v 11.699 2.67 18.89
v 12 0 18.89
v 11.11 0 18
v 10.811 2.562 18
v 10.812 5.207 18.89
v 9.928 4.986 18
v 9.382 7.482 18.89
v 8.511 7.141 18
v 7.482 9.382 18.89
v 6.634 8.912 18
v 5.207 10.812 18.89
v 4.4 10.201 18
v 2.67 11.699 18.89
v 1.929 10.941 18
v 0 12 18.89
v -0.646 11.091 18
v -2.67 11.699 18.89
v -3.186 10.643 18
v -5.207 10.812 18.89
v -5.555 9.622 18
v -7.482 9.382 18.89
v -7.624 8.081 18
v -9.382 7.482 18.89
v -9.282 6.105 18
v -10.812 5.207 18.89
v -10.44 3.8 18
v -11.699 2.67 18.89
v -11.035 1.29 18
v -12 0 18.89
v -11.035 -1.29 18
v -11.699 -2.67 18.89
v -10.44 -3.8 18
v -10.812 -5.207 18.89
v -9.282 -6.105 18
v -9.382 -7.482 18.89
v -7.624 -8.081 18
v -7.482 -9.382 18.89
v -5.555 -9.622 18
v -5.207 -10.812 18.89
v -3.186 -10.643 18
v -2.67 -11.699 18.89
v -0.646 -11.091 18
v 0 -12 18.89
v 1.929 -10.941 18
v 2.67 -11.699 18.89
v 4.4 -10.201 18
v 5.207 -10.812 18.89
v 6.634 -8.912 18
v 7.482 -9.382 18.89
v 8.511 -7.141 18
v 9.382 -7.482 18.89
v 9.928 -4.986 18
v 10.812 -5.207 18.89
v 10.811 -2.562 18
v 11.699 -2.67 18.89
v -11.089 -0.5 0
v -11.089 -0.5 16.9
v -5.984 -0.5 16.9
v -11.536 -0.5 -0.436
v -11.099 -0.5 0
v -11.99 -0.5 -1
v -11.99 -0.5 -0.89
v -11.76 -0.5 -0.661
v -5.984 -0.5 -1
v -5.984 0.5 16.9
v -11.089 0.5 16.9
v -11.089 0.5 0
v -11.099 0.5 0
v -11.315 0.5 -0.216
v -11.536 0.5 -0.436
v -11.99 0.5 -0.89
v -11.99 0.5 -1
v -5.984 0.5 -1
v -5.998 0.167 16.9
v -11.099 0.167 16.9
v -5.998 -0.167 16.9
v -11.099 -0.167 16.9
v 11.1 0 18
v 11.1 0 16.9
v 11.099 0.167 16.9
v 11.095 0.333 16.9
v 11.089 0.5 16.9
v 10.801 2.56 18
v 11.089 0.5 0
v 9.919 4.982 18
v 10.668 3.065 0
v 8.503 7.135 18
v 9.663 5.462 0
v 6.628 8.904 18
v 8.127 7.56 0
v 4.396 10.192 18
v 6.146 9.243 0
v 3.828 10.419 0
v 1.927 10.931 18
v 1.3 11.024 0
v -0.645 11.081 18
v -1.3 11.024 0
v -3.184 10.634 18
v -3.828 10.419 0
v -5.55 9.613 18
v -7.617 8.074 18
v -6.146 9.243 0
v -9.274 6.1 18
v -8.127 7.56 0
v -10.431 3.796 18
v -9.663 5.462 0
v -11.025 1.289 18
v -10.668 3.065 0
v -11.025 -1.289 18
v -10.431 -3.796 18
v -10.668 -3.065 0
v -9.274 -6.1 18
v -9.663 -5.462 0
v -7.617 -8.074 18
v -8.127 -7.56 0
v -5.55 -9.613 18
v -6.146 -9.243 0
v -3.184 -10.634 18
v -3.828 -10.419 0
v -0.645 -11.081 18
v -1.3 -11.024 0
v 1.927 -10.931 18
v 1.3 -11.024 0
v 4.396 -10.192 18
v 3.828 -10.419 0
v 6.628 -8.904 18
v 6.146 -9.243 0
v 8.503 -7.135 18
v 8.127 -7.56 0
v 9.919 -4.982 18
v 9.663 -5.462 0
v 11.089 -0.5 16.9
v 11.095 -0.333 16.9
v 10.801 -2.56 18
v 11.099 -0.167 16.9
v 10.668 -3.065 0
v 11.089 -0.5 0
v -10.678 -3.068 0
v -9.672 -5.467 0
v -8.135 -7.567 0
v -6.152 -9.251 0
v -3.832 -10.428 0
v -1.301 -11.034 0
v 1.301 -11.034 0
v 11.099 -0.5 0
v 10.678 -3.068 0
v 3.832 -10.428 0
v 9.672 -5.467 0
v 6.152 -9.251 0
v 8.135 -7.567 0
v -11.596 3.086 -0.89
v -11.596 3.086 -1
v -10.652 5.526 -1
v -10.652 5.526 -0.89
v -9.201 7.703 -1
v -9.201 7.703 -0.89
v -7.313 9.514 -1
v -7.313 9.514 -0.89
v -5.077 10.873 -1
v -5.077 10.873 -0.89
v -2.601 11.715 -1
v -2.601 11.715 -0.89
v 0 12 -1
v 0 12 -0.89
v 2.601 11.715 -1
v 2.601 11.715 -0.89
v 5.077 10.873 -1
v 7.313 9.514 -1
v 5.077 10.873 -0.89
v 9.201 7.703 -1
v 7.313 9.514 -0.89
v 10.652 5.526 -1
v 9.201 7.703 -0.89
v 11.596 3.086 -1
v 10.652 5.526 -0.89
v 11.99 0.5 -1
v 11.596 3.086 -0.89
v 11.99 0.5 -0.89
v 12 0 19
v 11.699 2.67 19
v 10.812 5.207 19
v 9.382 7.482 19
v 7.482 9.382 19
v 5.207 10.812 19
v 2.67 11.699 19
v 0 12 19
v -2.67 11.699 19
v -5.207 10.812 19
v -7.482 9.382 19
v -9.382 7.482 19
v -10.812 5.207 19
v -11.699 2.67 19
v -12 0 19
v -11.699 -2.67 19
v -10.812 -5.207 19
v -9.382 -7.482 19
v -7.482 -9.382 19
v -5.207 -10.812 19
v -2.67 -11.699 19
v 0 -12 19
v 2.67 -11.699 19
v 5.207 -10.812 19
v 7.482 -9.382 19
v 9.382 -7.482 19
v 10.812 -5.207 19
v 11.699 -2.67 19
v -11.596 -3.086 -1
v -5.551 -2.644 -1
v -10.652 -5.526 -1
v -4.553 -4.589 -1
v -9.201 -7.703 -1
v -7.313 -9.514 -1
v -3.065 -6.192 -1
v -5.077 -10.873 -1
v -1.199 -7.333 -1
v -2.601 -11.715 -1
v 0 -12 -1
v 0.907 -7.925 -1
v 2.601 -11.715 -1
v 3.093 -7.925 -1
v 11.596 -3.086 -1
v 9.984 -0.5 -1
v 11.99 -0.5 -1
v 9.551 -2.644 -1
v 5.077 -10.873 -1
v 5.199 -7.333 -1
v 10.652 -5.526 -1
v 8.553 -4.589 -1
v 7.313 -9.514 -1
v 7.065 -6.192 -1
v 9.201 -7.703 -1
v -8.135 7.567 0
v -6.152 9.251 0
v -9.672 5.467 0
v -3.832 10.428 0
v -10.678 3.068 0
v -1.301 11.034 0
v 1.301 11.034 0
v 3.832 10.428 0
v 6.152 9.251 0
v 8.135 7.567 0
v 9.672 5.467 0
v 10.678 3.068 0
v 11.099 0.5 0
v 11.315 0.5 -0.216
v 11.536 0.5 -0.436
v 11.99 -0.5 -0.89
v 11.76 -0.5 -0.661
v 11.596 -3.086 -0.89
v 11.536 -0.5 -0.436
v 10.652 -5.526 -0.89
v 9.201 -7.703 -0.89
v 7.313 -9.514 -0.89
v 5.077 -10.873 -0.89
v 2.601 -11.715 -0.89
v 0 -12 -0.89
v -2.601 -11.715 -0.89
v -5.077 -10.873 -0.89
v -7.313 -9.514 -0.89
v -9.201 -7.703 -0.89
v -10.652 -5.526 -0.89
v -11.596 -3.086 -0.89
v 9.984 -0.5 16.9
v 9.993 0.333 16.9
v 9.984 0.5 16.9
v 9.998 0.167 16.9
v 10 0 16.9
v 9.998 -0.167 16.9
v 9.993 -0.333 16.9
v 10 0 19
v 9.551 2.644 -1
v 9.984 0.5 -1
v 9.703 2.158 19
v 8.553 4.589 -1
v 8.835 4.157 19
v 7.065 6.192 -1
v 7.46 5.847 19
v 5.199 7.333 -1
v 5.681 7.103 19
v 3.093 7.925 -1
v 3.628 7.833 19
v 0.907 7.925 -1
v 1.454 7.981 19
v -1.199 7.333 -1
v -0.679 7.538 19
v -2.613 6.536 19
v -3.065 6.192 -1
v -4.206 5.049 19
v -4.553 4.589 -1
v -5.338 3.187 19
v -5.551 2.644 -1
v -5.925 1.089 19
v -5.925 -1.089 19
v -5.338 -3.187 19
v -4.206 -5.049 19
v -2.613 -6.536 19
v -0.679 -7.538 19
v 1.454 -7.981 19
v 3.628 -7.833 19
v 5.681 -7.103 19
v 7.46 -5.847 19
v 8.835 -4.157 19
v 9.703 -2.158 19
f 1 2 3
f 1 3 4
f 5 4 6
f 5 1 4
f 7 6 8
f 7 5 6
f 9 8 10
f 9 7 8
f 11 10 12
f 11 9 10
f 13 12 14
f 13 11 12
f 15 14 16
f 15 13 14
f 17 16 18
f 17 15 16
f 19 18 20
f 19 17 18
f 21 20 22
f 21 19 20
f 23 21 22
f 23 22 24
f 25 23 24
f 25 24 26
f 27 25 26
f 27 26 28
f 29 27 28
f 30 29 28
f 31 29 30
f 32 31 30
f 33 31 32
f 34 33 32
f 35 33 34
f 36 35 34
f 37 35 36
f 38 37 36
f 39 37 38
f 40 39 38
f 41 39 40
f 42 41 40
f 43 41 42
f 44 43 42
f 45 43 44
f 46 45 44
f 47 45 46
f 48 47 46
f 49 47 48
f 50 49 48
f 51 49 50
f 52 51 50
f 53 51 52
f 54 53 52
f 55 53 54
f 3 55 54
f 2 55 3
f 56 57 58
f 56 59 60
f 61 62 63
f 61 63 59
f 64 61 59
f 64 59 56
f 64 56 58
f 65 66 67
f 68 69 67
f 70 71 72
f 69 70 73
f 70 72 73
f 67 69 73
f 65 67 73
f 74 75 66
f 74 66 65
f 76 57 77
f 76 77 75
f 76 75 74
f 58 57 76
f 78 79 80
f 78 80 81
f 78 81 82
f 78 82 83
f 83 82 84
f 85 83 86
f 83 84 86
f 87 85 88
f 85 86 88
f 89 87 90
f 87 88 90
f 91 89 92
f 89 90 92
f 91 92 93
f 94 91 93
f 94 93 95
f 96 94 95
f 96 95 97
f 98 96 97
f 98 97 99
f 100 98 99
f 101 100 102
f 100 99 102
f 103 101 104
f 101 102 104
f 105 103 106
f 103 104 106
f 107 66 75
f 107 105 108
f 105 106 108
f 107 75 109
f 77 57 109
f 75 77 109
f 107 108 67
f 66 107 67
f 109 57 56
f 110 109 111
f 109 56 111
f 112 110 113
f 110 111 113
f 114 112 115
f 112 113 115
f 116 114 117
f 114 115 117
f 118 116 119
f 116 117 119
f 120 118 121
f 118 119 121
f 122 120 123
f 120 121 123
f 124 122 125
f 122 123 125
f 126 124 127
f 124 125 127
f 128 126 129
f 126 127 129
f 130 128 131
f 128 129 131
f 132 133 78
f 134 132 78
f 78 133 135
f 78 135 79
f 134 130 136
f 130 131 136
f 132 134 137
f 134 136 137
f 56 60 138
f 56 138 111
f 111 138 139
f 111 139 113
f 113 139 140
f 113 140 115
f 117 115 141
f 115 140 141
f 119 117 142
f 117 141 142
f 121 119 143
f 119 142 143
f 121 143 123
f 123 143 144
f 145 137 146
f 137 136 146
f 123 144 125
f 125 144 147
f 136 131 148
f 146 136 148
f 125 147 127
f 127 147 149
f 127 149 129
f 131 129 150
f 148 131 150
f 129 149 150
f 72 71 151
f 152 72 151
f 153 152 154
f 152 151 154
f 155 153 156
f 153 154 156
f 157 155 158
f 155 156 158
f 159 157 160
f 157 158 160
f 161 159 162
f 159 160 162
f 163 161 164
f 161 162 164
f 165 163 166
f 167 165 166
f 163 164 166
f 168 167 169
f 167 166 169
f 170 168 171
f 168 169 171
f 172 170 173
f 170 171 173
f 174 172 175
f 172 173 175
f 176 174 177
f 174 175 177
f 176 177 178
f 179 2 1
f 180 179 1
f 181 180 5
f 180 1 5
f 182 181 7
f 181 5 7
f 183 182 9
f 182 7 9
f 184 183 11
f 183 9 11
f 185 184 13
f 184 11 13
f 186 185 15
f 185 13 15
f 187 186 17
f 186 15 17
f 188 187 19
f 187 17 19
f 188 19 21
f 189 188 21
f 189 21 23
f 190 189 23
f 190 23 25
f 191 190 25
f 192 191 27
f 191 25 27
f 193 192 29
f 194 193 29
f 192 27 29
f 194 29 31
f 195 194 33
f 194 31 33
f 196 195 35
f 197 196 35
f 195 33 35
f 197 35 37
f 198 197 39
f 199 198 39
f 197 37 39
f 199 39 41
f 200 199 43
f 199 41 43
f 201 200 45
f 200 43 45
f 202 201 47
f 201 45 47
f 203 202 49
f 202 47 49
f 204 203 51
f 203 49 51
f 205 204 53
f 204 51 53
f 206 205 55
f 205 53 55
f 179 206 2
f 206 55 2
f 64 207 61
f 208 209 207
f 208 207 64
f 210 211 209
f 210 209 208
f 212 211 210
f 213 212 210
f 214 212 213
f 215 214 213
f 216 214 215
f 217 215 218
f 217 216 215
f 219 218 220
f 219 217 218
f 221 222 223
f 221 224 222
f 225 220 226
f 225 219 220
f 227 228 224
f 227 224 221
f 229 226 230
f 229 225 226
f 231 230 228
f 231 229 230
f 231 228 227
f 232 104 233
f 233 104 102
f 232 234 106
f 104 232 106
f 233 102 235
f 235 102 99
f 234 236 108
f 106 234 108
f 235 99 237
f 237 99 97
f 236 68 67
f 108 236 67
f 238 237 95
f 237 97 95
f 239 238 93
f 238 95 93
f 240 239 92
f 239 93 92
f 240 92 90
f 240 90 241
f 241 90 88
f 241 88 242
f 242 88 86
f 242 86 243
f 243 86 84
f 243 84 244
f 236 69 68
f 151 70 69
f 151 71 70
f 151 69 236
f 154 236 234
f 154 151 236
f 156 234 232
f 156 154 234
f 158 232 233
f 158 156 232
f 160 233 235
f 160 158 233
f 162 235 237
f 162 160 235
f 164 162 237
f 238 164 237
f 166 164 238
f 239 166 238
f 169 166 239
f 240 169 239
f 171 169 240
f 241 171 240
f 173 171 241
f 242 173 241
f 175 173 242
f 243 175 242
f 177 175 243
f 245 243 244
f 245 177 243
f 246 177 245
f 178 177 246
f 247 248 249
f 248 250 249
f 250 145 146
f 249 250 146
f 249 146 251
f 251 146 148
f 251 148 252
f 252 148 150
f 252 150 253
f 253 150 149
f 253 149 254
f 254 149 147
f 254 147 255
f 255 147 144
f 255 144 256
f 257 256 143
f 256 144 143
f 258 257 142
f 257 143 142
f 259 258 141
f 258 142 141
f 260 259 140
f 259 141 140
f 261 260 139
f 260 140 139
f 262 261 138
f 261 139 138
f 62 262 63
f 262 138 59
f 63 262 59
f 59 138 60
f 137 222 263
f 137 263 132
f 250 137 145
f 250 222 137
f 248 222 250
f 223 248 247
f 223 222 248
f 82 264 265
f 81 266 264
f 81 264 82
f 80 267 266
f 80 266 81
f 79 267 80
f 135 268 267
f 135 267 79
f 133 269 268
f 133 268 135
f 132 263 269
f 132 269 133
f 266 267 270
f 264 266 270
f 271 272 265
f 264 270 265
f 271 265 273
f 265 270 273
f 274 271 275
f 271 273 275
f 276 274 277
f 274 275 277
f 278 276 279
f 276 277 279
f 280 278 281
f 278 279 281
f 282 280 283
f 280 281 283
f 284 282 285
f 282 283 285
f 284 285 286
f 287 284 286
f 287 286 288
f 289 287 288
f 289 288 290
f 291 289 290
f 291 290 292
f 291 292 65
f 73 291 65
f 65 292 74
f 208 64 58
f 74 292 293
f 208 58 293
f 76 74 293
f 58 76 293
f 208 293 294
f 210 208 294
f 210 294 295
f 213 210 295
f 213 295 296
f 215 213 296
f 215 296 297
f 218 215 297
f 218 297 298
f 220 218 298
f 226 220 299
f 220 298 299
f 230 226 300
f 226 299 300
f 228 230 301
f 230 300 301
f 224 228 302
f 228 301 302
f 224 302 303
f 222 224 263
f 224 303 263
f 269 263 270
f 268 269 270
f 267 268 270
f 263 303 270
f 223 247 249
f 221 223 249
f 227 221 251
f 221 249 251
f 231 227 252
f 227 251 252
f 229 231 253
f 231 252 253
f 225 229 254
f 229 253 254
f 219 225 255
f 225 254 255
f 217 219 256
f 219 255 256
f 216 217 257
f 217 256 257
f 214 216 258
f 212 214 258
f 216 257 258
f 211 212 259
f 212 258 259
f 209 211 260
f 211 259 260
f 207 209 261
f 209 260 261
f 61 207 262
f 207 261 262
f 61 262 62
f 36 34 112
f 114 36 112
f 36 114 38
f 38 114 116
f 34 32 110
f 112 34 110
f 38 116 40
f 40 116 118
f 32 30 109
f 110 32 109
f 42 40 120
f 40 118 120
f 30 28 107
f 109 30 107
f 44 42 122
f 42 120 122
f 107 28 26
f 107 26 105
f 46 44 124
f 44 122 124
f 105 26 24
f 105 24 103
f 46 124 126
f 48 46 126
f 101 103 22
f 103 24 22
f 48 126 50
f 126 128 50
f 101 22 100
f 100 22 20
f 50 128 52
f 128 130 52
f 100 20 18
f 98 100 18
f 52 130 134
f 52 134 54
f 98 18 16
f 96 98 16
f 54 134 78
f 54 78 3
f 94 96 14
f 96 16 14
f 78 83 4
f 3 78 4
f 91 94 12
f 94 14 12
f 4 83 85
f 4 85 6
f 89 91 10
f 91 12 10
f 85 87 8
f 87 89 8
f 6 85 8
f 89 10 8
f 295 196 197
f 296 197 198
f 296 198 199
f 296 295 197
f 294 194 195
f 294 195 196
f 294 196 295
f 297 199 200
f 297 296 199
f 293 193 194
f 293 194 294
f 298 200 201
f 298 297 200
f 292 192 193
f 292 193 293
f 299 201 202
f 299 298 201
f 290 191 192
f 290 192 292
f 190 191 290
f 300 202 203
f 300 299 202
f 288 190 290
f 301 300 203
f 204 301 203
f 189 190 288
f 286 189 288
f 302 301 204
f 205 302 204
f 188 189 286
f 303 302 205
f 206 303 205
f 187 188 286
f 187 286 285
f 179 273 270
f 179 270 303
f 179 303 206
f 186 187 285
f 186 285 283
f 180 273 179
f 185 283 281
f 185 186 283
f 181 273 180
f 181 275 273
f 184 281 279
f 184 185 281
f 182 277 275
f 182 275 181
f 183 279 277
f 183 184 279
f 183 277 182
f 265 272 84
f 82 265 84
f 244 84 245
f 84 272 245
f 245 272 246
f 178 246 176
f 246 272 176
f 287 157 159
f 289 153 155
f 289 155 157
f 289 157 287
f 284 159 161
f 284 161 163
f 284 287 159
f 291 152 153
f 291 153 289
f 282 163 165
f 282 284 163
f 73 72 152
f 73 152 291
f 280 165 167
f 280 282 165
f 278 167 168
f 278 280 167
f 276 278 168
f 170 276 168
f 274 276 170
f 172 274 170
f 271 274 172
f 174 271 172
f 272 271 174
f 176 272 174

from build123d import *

# Parameters (mm, degrees)
SKETCH_R        = 11.1
PAD_DEPTH       = 18
SKETCH001_R     = 12
PAD001_DEPTH    = 1
SKETCH002_R     = 12
PAD002_DEPTH    = 1
SKETCH003_R     = 8
POCKET_DEPTH    = 20.001
SKETCH004_W     = 70
SKETCH004_H     = 1
POCKET001_DEPTH = 17.9
CHAMFER_SIZE    = 0.89


with BuildPart() as part:
    # Sketch → Pad (new body)
    with BuildSketch(Plane.XY):
        Circle(SKETCH_R)
    extrude(amount=PAD_DEPTH)

    # Sketch001 → Pad001 (new body)
    with BuildSketch(Plane.XY.offset(18)):
        Circle(SKETCH001_R)
    extrude(amount=PAD001_DEPTH)

    # Sketch002 → Pad002 (new body)
    with BuildSketch(Plane(origin=(0, 0, 0), x_dir=(1, 0, 0), z_dir=(0, 0, -1))):
        Circle(SKETCH002_R)
    extrude(amount=PAD002_DEPTH)

    # Sketch003 → Pocket (cut, through all)
    with BuildSketch(Plane.XY.offset(19)):
        with Locations((2, 0)):
            Circle(SKETCH003_R)
    extrude(amount=-POCKET_DEPTH, mode=Mode.SUBTRACT)

    # Sketch004 → Pocket001 (cut)
    with BuildSketch(Plane(origin=(0, 0, -1), x_dir=(1, 0, 0), z_dir=(0, 0, -1))):
        Rectangle(SKETCH004_W, SKETCH004_H)
    extrude(amount=-POCKET001_DEPTH, mode=Mode.SUBTRACT)

    # Chamfer
    chamfer_edges = [part.edges().sort_by_distance(p)[0] for p in [
        (0, -12, 0),
        (0, 12, 0),
        (-12, 0, 18),
    ]]
    chamfer(chamfer_edges, length=CHAMFER_SIZE)


solid = part.part
